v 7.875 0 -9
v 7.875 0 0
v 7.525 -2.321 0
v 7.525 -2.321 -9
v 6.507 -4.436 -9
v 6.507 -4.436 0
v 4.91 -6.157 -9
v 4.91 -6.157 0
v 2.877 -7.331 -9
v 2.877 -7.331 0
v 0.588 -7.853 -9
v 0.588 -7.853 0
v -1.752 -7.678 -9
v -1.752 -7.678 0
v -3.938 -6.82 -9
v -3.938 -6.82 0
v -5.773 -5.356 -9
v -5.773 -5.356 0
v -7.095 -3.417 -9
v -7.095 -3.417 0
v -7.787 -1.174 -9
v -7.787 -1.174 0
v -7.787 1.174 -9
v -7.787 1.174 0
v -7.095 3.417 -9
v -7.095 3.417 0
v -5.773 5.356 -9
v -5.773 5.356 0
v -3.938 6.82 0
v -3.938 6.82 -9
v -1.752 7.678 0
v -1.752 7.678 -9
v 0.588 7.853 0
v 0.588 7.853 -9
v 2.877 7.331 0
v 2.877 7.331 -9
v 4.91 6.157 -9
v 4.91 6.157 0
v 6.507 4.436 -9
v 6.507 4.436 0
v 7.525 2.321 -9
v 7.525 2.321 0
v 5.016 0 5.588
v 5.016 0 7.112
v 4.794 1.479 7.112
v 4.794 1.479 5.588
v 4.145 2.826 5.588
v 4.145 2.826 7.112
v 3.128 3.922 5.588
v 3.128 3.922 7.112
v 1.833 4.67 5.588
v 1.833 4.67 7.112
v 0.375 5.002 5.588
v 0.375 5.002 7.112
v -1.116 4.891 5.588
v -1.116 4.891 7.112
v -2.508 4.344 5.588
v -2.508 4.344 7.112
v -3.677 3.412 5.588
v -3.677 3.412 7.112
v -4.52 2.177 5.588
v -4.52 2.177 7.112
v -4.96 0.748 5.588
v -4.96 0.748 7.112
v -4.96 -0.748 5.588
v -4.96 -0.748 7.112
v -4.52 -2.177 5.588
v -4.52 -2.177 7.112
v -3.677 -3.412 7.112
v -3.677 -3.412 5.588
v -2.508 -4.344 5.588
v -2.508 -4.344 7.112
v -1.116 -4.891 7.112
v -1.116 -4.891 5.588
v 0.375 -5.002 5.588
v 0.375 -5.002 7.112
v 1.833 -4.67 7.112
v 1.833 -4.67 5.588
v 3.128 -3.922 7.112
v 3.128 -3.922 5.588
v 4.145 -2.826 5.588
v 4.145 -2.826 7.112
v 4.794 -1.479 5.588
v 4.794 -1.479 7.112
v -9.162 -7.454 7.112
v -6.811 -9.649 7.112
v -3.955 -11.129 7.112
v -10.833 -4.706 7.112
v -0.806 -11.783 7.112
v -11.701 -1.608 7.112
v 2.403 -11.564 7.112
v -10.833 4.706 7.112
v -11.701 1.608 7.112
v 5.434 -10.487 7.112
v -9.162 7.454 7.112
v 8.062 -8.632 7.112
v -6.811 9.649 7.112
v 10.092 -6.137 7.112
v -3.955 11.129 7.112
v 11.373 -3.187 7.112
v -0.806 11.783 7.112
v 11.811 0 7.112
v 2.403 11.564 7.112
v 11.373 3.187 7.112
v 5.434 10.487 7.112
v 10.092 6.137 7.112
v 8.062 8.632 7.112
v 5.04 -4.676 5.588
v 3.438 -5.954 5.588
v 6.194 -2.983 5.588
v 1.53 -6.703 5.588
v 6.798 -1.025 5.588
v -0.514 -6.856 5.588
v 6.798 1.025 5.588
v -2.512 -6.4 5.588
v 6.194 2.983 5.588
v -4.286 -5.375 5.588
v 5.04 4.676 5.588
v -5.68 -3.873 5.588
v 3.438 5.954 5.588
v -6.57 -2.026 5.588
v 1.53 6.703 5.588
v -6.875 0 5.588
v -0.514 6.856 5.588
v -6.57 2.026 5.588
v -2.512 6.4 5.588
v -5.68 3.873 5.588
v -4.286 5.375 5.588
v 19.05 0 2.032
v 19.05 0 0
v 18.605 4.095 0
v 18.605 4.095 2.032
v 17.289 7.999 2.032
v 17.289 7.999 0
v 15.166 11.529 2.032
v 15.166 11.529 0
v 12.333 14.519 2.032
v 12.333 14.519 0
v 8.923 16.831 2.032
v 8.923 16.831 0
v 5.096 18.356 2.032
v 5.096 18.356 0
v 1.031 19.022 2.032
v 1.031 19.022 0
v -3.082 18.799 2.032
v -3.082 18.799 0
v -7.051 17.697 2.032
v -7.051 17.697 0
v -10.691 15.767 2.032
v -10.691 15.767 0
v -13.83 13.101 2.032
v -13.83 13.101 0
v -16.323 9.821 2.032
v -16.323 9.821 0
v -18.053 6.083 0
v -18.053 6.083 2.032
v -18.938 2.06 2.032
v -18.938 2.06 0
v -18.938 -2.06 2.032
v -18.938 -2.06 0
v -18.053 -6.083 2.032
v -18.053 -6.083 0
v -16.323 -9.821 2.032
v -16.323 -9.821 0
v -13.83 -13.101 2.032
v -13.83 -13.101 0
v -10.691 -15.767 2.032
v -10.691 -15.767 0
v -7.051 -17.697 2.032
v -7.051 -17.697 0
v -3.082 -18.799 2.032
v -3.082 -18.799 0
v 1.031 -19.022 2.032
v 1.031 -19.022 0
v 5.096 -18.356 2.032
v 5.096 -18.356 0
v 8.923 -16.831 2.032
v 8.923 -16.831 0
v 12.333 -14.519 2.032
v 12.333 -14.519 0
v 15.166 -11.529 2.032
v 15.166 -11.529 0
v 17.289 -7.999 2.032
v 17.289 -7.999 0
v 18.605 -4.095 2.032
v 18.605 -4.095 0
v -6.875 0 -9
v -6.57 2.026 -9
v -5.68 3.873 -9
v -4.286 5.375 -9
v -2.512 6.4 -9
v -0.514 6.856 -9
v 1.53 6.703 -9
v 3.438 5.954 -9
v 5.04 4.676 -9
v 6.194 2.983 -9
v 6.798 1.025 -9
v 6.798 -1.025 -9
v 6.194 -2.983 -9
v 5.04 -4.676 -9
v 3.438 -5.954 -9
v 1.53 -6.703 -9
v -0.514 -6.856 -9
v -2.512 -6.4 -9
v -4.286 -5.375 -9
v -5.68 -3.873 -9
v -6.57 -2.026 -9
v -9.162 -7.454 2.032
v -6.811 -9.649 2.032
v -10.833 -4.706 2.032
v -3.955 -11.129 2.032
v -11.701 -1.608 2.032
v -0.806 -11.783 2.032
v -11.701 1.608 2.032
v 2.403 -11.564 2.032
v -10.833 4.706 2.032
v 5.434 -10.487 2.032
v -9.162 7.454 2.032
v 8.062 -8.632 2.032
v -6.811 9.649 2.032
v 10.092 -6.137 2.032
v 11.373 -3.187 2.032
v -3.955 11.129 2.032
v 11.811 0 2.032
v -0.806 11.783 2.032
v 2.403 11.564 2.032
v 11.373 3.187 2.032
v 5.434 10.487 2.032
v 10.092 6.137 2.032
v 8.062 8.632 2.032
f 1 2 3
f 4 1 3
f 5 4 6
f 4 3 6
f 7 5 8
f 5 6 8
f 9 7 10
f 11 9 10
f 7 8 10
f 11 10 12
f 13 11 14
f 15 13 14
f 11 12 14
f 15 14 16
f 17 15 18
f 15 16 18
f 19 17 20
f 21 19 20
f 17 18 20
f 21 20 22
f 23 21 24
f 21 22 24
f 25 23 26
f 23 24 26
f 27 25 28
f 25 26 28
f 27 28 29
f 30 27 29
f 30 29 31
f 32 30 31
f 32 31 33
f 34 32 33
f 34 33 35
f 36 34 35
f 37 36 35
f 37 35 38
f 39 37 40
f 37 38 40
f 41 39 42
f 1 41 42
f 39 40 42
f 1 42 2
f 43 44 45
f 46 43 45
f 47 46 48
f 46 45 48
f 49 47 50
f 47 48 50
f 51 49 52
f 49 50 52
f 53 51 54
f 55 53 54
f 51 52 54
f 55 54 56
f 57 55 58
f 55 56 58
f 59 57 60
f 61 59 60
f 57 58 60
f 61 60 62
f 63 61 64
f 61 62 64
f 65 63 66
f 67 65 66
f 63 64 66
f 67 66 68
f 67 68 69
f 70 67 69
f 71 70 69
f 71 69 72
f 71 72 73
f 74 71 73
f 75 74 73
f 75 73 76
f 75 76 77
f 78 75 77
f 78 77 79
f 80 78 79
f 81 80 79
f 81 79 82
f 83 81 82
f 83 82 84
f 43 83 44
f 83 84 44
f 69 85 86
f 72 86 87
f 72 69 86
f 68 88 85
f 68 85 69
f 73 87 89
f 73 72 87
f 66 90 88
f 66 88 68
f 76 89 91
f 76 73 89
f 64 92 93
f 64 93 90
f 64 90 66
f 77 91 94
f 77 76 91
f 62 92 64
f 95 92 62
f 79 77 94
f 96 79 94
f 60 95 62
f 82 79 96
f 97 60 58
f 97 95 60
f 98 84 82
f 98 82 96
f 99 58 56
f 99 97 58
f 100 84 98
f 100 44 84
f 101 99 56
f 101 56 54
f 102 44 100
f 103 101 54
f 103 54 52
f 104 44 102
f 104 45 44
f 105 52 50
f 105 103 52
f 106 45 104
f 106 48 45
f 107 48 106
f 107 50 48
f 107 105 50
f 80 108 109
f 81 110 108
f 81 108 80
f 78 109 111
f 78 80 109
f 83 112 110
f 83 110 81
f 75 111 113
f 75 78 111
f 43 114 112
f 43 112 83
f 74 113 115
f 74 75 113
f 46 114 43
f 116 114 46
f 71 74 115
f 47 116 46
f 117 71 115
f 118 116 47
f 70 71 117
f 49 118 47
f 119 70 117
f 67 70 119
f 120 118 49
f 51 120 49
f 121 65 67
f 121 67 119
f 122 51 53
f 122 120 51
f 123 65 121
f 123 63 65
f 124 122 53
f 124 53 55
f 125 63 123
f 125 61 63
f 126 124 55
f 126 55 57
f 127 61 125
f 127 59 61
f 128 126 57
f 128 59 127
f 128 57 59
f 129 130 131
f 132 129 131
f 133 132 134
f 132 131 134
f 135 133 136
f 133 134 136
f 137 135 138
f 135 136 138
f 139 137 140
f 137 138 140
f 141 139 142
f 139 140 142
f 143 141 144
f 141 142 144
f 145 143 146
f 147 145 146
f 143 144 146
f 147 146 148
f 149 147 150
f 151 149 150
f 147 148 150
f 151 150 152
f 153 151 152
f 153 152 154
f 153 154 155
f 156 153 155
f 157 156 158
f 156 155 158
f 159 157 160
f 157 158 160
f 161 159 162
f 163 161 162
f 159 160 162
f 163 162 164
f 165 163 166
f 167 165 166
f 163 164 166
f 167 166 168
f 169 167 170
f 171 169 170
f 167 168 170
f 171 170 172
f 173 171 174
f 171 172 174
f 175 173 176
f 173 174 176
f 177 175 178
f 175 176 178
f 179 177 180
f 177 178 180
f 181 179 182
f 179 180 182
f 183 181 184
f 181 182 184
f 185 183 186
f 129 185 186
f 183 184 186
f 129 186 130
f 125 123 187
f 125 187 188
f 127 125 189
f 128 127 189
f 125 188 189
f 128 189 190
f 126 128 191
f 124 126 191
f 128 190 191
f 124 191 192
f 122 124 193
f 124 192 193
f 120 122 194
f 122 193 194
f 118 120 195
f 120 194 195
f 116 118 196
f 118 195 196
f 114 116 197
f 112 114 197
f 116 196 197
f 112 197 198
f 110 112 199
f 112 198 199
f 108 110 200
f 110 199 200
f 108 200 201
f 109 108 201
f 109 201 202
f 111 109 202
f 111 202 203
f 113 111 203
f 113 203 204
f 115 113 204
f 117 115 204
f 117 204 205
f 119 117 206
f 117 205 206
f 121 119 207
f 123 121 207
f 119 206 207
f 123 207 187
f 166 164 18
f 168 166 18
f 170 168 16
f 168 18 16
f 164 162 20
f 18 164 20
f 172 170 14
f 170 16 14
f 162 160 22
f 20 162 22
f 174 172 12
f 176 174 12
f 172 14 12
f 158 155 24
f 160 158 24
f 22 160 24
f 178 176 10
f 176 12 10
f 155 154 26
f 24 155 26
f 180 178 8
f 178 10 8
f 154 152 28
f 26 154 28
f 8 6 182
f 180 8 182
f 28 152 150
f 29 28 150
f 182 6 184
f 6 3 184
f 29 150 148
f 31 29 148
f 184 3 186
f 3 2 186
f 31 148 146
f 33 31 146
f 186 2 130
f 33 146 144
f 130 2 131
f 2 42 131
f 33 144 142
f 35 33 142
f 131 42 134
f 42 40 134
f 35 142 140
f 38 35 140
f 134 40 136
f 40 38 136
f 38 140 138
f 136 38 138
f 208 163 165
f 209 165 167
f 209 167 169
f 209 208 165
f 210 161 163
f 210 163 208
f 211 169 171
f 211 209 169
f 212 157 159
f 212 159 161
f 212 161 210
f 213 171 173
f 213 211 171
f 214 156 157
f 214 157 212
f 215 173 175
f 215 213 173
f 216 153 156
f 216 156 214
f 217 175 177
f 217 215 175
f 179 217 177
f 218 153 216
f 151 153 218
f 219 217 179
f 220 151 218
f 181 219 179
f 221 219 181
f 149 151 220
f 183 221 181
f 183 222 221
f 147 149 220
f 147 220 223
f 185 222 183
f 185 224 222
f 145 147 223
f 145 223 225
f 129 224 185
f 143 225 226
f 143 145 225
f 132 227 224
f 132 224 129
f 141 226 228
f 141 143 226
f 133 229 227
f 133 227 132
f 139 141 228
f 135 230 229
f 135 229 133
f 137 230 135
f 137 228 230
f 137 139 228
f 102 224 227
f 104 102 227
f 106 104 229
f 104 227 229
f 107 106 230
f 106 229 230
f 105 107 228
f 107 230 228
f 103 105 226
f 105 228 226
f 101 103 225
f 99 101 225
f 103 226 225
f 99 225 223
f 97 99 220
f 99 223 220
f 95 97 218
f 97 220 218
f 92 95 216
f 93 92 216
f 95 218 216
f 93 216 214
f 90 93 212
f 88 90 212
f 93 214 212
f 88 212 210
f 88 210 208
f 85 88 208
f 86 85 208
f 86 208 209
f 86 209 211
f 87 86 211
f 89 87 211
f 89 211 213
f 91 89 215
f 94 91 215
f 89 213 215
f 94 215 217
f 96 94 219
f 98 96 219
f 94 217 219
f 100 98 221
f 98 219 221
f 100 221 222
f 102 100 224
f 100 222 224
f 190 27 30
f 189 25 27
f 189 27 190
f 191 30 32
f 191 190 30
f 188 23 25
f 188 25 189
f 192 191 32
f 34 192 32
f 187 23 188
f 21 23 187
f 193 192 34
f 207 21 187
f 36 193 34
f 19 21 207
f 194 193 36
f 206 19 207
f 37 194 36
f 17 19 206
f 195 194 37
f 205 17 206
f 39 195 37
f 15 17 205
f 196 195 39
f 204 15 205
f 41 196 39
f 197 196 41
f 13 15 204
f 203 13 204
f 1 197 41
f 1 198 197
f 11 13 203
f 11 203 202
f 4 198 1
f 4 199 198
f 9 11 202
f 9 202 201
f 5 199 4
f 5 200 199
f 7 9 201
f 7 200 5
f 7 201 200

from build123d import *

# Parameters (mm, degrees)
ESQUISSE1_R             = 19.05
BOSS_EXTRU_1_DEPTH      = 2.032
ESQUISSE2_R             = 11.811
BOSS_EXTRU_2_DEPTH      = 5.08
ESQUISSE3_R             = 5.0165
ENL_V_MAT_EXTRU_1_DEPTH = 1.524
ESQUISSE4_R             = 7.875
BOSS_EXTRU_3_DEPTH      = 9
ESQUISSE5_R             = 6.875
ENL_V_MAT_EXTRU_2_DEPTH = 14.588


with BuildPart() as part:
    # Esquisse1 → Boss.-Extru.1 (new body)
    with BuildSketch(Plane.XY):
        Circle(ESQUISSE1_R)
    extrude(amount=BOSS_EXTRU_1_DEPTH)

    # Esquisse2 → Boss.-Extru.2 (add)
    with BuildSketch(Plane.XY.offset(2.032)):
        Circle(ESQUISSE2_R)
    extrude(amount=BOSS_EXTRU_2_DEPTH)

    # Esquisse3 → Enlèv. mat.-Extru.1 (cut)
    with BuildSketch(Plane.XY.offset(7.112)):
        Circle(ESQUISSE3_R)
    extrude(amount=-ENL_V_MAT_EXTRU_1_DEPTH, mode=Mode.SUBTRACT)

    # Esquisse4 → Boss.-Extru.3 (add)
    with BuildSketch(Plane(origin=(0, 0, 0), x_dir=(-1, 0, 0), z_dir=(0, 0, -1))):
        with Locations(Location((0, 0, 0), (0, 0, 180))):
            Circle(ESQUISSE4_R)
    extrude(amount=BOSS_EXTRU_3_DEPTH)

    # Esquisse5 → Enlèv. mat.-Extru.2 (cut)
    with BuildSketch(Plane(origin=(0, 0, -9), x_dir=(-1, 0, 0), z_dir=(0, 0, -1))):
        Circle(ESQUISSE5_R)
    extrude(amount=-ENL_V_MAT_EXTRU_2_DEPTH, mode=Mode.SUBTRACT)


solid = part.part
